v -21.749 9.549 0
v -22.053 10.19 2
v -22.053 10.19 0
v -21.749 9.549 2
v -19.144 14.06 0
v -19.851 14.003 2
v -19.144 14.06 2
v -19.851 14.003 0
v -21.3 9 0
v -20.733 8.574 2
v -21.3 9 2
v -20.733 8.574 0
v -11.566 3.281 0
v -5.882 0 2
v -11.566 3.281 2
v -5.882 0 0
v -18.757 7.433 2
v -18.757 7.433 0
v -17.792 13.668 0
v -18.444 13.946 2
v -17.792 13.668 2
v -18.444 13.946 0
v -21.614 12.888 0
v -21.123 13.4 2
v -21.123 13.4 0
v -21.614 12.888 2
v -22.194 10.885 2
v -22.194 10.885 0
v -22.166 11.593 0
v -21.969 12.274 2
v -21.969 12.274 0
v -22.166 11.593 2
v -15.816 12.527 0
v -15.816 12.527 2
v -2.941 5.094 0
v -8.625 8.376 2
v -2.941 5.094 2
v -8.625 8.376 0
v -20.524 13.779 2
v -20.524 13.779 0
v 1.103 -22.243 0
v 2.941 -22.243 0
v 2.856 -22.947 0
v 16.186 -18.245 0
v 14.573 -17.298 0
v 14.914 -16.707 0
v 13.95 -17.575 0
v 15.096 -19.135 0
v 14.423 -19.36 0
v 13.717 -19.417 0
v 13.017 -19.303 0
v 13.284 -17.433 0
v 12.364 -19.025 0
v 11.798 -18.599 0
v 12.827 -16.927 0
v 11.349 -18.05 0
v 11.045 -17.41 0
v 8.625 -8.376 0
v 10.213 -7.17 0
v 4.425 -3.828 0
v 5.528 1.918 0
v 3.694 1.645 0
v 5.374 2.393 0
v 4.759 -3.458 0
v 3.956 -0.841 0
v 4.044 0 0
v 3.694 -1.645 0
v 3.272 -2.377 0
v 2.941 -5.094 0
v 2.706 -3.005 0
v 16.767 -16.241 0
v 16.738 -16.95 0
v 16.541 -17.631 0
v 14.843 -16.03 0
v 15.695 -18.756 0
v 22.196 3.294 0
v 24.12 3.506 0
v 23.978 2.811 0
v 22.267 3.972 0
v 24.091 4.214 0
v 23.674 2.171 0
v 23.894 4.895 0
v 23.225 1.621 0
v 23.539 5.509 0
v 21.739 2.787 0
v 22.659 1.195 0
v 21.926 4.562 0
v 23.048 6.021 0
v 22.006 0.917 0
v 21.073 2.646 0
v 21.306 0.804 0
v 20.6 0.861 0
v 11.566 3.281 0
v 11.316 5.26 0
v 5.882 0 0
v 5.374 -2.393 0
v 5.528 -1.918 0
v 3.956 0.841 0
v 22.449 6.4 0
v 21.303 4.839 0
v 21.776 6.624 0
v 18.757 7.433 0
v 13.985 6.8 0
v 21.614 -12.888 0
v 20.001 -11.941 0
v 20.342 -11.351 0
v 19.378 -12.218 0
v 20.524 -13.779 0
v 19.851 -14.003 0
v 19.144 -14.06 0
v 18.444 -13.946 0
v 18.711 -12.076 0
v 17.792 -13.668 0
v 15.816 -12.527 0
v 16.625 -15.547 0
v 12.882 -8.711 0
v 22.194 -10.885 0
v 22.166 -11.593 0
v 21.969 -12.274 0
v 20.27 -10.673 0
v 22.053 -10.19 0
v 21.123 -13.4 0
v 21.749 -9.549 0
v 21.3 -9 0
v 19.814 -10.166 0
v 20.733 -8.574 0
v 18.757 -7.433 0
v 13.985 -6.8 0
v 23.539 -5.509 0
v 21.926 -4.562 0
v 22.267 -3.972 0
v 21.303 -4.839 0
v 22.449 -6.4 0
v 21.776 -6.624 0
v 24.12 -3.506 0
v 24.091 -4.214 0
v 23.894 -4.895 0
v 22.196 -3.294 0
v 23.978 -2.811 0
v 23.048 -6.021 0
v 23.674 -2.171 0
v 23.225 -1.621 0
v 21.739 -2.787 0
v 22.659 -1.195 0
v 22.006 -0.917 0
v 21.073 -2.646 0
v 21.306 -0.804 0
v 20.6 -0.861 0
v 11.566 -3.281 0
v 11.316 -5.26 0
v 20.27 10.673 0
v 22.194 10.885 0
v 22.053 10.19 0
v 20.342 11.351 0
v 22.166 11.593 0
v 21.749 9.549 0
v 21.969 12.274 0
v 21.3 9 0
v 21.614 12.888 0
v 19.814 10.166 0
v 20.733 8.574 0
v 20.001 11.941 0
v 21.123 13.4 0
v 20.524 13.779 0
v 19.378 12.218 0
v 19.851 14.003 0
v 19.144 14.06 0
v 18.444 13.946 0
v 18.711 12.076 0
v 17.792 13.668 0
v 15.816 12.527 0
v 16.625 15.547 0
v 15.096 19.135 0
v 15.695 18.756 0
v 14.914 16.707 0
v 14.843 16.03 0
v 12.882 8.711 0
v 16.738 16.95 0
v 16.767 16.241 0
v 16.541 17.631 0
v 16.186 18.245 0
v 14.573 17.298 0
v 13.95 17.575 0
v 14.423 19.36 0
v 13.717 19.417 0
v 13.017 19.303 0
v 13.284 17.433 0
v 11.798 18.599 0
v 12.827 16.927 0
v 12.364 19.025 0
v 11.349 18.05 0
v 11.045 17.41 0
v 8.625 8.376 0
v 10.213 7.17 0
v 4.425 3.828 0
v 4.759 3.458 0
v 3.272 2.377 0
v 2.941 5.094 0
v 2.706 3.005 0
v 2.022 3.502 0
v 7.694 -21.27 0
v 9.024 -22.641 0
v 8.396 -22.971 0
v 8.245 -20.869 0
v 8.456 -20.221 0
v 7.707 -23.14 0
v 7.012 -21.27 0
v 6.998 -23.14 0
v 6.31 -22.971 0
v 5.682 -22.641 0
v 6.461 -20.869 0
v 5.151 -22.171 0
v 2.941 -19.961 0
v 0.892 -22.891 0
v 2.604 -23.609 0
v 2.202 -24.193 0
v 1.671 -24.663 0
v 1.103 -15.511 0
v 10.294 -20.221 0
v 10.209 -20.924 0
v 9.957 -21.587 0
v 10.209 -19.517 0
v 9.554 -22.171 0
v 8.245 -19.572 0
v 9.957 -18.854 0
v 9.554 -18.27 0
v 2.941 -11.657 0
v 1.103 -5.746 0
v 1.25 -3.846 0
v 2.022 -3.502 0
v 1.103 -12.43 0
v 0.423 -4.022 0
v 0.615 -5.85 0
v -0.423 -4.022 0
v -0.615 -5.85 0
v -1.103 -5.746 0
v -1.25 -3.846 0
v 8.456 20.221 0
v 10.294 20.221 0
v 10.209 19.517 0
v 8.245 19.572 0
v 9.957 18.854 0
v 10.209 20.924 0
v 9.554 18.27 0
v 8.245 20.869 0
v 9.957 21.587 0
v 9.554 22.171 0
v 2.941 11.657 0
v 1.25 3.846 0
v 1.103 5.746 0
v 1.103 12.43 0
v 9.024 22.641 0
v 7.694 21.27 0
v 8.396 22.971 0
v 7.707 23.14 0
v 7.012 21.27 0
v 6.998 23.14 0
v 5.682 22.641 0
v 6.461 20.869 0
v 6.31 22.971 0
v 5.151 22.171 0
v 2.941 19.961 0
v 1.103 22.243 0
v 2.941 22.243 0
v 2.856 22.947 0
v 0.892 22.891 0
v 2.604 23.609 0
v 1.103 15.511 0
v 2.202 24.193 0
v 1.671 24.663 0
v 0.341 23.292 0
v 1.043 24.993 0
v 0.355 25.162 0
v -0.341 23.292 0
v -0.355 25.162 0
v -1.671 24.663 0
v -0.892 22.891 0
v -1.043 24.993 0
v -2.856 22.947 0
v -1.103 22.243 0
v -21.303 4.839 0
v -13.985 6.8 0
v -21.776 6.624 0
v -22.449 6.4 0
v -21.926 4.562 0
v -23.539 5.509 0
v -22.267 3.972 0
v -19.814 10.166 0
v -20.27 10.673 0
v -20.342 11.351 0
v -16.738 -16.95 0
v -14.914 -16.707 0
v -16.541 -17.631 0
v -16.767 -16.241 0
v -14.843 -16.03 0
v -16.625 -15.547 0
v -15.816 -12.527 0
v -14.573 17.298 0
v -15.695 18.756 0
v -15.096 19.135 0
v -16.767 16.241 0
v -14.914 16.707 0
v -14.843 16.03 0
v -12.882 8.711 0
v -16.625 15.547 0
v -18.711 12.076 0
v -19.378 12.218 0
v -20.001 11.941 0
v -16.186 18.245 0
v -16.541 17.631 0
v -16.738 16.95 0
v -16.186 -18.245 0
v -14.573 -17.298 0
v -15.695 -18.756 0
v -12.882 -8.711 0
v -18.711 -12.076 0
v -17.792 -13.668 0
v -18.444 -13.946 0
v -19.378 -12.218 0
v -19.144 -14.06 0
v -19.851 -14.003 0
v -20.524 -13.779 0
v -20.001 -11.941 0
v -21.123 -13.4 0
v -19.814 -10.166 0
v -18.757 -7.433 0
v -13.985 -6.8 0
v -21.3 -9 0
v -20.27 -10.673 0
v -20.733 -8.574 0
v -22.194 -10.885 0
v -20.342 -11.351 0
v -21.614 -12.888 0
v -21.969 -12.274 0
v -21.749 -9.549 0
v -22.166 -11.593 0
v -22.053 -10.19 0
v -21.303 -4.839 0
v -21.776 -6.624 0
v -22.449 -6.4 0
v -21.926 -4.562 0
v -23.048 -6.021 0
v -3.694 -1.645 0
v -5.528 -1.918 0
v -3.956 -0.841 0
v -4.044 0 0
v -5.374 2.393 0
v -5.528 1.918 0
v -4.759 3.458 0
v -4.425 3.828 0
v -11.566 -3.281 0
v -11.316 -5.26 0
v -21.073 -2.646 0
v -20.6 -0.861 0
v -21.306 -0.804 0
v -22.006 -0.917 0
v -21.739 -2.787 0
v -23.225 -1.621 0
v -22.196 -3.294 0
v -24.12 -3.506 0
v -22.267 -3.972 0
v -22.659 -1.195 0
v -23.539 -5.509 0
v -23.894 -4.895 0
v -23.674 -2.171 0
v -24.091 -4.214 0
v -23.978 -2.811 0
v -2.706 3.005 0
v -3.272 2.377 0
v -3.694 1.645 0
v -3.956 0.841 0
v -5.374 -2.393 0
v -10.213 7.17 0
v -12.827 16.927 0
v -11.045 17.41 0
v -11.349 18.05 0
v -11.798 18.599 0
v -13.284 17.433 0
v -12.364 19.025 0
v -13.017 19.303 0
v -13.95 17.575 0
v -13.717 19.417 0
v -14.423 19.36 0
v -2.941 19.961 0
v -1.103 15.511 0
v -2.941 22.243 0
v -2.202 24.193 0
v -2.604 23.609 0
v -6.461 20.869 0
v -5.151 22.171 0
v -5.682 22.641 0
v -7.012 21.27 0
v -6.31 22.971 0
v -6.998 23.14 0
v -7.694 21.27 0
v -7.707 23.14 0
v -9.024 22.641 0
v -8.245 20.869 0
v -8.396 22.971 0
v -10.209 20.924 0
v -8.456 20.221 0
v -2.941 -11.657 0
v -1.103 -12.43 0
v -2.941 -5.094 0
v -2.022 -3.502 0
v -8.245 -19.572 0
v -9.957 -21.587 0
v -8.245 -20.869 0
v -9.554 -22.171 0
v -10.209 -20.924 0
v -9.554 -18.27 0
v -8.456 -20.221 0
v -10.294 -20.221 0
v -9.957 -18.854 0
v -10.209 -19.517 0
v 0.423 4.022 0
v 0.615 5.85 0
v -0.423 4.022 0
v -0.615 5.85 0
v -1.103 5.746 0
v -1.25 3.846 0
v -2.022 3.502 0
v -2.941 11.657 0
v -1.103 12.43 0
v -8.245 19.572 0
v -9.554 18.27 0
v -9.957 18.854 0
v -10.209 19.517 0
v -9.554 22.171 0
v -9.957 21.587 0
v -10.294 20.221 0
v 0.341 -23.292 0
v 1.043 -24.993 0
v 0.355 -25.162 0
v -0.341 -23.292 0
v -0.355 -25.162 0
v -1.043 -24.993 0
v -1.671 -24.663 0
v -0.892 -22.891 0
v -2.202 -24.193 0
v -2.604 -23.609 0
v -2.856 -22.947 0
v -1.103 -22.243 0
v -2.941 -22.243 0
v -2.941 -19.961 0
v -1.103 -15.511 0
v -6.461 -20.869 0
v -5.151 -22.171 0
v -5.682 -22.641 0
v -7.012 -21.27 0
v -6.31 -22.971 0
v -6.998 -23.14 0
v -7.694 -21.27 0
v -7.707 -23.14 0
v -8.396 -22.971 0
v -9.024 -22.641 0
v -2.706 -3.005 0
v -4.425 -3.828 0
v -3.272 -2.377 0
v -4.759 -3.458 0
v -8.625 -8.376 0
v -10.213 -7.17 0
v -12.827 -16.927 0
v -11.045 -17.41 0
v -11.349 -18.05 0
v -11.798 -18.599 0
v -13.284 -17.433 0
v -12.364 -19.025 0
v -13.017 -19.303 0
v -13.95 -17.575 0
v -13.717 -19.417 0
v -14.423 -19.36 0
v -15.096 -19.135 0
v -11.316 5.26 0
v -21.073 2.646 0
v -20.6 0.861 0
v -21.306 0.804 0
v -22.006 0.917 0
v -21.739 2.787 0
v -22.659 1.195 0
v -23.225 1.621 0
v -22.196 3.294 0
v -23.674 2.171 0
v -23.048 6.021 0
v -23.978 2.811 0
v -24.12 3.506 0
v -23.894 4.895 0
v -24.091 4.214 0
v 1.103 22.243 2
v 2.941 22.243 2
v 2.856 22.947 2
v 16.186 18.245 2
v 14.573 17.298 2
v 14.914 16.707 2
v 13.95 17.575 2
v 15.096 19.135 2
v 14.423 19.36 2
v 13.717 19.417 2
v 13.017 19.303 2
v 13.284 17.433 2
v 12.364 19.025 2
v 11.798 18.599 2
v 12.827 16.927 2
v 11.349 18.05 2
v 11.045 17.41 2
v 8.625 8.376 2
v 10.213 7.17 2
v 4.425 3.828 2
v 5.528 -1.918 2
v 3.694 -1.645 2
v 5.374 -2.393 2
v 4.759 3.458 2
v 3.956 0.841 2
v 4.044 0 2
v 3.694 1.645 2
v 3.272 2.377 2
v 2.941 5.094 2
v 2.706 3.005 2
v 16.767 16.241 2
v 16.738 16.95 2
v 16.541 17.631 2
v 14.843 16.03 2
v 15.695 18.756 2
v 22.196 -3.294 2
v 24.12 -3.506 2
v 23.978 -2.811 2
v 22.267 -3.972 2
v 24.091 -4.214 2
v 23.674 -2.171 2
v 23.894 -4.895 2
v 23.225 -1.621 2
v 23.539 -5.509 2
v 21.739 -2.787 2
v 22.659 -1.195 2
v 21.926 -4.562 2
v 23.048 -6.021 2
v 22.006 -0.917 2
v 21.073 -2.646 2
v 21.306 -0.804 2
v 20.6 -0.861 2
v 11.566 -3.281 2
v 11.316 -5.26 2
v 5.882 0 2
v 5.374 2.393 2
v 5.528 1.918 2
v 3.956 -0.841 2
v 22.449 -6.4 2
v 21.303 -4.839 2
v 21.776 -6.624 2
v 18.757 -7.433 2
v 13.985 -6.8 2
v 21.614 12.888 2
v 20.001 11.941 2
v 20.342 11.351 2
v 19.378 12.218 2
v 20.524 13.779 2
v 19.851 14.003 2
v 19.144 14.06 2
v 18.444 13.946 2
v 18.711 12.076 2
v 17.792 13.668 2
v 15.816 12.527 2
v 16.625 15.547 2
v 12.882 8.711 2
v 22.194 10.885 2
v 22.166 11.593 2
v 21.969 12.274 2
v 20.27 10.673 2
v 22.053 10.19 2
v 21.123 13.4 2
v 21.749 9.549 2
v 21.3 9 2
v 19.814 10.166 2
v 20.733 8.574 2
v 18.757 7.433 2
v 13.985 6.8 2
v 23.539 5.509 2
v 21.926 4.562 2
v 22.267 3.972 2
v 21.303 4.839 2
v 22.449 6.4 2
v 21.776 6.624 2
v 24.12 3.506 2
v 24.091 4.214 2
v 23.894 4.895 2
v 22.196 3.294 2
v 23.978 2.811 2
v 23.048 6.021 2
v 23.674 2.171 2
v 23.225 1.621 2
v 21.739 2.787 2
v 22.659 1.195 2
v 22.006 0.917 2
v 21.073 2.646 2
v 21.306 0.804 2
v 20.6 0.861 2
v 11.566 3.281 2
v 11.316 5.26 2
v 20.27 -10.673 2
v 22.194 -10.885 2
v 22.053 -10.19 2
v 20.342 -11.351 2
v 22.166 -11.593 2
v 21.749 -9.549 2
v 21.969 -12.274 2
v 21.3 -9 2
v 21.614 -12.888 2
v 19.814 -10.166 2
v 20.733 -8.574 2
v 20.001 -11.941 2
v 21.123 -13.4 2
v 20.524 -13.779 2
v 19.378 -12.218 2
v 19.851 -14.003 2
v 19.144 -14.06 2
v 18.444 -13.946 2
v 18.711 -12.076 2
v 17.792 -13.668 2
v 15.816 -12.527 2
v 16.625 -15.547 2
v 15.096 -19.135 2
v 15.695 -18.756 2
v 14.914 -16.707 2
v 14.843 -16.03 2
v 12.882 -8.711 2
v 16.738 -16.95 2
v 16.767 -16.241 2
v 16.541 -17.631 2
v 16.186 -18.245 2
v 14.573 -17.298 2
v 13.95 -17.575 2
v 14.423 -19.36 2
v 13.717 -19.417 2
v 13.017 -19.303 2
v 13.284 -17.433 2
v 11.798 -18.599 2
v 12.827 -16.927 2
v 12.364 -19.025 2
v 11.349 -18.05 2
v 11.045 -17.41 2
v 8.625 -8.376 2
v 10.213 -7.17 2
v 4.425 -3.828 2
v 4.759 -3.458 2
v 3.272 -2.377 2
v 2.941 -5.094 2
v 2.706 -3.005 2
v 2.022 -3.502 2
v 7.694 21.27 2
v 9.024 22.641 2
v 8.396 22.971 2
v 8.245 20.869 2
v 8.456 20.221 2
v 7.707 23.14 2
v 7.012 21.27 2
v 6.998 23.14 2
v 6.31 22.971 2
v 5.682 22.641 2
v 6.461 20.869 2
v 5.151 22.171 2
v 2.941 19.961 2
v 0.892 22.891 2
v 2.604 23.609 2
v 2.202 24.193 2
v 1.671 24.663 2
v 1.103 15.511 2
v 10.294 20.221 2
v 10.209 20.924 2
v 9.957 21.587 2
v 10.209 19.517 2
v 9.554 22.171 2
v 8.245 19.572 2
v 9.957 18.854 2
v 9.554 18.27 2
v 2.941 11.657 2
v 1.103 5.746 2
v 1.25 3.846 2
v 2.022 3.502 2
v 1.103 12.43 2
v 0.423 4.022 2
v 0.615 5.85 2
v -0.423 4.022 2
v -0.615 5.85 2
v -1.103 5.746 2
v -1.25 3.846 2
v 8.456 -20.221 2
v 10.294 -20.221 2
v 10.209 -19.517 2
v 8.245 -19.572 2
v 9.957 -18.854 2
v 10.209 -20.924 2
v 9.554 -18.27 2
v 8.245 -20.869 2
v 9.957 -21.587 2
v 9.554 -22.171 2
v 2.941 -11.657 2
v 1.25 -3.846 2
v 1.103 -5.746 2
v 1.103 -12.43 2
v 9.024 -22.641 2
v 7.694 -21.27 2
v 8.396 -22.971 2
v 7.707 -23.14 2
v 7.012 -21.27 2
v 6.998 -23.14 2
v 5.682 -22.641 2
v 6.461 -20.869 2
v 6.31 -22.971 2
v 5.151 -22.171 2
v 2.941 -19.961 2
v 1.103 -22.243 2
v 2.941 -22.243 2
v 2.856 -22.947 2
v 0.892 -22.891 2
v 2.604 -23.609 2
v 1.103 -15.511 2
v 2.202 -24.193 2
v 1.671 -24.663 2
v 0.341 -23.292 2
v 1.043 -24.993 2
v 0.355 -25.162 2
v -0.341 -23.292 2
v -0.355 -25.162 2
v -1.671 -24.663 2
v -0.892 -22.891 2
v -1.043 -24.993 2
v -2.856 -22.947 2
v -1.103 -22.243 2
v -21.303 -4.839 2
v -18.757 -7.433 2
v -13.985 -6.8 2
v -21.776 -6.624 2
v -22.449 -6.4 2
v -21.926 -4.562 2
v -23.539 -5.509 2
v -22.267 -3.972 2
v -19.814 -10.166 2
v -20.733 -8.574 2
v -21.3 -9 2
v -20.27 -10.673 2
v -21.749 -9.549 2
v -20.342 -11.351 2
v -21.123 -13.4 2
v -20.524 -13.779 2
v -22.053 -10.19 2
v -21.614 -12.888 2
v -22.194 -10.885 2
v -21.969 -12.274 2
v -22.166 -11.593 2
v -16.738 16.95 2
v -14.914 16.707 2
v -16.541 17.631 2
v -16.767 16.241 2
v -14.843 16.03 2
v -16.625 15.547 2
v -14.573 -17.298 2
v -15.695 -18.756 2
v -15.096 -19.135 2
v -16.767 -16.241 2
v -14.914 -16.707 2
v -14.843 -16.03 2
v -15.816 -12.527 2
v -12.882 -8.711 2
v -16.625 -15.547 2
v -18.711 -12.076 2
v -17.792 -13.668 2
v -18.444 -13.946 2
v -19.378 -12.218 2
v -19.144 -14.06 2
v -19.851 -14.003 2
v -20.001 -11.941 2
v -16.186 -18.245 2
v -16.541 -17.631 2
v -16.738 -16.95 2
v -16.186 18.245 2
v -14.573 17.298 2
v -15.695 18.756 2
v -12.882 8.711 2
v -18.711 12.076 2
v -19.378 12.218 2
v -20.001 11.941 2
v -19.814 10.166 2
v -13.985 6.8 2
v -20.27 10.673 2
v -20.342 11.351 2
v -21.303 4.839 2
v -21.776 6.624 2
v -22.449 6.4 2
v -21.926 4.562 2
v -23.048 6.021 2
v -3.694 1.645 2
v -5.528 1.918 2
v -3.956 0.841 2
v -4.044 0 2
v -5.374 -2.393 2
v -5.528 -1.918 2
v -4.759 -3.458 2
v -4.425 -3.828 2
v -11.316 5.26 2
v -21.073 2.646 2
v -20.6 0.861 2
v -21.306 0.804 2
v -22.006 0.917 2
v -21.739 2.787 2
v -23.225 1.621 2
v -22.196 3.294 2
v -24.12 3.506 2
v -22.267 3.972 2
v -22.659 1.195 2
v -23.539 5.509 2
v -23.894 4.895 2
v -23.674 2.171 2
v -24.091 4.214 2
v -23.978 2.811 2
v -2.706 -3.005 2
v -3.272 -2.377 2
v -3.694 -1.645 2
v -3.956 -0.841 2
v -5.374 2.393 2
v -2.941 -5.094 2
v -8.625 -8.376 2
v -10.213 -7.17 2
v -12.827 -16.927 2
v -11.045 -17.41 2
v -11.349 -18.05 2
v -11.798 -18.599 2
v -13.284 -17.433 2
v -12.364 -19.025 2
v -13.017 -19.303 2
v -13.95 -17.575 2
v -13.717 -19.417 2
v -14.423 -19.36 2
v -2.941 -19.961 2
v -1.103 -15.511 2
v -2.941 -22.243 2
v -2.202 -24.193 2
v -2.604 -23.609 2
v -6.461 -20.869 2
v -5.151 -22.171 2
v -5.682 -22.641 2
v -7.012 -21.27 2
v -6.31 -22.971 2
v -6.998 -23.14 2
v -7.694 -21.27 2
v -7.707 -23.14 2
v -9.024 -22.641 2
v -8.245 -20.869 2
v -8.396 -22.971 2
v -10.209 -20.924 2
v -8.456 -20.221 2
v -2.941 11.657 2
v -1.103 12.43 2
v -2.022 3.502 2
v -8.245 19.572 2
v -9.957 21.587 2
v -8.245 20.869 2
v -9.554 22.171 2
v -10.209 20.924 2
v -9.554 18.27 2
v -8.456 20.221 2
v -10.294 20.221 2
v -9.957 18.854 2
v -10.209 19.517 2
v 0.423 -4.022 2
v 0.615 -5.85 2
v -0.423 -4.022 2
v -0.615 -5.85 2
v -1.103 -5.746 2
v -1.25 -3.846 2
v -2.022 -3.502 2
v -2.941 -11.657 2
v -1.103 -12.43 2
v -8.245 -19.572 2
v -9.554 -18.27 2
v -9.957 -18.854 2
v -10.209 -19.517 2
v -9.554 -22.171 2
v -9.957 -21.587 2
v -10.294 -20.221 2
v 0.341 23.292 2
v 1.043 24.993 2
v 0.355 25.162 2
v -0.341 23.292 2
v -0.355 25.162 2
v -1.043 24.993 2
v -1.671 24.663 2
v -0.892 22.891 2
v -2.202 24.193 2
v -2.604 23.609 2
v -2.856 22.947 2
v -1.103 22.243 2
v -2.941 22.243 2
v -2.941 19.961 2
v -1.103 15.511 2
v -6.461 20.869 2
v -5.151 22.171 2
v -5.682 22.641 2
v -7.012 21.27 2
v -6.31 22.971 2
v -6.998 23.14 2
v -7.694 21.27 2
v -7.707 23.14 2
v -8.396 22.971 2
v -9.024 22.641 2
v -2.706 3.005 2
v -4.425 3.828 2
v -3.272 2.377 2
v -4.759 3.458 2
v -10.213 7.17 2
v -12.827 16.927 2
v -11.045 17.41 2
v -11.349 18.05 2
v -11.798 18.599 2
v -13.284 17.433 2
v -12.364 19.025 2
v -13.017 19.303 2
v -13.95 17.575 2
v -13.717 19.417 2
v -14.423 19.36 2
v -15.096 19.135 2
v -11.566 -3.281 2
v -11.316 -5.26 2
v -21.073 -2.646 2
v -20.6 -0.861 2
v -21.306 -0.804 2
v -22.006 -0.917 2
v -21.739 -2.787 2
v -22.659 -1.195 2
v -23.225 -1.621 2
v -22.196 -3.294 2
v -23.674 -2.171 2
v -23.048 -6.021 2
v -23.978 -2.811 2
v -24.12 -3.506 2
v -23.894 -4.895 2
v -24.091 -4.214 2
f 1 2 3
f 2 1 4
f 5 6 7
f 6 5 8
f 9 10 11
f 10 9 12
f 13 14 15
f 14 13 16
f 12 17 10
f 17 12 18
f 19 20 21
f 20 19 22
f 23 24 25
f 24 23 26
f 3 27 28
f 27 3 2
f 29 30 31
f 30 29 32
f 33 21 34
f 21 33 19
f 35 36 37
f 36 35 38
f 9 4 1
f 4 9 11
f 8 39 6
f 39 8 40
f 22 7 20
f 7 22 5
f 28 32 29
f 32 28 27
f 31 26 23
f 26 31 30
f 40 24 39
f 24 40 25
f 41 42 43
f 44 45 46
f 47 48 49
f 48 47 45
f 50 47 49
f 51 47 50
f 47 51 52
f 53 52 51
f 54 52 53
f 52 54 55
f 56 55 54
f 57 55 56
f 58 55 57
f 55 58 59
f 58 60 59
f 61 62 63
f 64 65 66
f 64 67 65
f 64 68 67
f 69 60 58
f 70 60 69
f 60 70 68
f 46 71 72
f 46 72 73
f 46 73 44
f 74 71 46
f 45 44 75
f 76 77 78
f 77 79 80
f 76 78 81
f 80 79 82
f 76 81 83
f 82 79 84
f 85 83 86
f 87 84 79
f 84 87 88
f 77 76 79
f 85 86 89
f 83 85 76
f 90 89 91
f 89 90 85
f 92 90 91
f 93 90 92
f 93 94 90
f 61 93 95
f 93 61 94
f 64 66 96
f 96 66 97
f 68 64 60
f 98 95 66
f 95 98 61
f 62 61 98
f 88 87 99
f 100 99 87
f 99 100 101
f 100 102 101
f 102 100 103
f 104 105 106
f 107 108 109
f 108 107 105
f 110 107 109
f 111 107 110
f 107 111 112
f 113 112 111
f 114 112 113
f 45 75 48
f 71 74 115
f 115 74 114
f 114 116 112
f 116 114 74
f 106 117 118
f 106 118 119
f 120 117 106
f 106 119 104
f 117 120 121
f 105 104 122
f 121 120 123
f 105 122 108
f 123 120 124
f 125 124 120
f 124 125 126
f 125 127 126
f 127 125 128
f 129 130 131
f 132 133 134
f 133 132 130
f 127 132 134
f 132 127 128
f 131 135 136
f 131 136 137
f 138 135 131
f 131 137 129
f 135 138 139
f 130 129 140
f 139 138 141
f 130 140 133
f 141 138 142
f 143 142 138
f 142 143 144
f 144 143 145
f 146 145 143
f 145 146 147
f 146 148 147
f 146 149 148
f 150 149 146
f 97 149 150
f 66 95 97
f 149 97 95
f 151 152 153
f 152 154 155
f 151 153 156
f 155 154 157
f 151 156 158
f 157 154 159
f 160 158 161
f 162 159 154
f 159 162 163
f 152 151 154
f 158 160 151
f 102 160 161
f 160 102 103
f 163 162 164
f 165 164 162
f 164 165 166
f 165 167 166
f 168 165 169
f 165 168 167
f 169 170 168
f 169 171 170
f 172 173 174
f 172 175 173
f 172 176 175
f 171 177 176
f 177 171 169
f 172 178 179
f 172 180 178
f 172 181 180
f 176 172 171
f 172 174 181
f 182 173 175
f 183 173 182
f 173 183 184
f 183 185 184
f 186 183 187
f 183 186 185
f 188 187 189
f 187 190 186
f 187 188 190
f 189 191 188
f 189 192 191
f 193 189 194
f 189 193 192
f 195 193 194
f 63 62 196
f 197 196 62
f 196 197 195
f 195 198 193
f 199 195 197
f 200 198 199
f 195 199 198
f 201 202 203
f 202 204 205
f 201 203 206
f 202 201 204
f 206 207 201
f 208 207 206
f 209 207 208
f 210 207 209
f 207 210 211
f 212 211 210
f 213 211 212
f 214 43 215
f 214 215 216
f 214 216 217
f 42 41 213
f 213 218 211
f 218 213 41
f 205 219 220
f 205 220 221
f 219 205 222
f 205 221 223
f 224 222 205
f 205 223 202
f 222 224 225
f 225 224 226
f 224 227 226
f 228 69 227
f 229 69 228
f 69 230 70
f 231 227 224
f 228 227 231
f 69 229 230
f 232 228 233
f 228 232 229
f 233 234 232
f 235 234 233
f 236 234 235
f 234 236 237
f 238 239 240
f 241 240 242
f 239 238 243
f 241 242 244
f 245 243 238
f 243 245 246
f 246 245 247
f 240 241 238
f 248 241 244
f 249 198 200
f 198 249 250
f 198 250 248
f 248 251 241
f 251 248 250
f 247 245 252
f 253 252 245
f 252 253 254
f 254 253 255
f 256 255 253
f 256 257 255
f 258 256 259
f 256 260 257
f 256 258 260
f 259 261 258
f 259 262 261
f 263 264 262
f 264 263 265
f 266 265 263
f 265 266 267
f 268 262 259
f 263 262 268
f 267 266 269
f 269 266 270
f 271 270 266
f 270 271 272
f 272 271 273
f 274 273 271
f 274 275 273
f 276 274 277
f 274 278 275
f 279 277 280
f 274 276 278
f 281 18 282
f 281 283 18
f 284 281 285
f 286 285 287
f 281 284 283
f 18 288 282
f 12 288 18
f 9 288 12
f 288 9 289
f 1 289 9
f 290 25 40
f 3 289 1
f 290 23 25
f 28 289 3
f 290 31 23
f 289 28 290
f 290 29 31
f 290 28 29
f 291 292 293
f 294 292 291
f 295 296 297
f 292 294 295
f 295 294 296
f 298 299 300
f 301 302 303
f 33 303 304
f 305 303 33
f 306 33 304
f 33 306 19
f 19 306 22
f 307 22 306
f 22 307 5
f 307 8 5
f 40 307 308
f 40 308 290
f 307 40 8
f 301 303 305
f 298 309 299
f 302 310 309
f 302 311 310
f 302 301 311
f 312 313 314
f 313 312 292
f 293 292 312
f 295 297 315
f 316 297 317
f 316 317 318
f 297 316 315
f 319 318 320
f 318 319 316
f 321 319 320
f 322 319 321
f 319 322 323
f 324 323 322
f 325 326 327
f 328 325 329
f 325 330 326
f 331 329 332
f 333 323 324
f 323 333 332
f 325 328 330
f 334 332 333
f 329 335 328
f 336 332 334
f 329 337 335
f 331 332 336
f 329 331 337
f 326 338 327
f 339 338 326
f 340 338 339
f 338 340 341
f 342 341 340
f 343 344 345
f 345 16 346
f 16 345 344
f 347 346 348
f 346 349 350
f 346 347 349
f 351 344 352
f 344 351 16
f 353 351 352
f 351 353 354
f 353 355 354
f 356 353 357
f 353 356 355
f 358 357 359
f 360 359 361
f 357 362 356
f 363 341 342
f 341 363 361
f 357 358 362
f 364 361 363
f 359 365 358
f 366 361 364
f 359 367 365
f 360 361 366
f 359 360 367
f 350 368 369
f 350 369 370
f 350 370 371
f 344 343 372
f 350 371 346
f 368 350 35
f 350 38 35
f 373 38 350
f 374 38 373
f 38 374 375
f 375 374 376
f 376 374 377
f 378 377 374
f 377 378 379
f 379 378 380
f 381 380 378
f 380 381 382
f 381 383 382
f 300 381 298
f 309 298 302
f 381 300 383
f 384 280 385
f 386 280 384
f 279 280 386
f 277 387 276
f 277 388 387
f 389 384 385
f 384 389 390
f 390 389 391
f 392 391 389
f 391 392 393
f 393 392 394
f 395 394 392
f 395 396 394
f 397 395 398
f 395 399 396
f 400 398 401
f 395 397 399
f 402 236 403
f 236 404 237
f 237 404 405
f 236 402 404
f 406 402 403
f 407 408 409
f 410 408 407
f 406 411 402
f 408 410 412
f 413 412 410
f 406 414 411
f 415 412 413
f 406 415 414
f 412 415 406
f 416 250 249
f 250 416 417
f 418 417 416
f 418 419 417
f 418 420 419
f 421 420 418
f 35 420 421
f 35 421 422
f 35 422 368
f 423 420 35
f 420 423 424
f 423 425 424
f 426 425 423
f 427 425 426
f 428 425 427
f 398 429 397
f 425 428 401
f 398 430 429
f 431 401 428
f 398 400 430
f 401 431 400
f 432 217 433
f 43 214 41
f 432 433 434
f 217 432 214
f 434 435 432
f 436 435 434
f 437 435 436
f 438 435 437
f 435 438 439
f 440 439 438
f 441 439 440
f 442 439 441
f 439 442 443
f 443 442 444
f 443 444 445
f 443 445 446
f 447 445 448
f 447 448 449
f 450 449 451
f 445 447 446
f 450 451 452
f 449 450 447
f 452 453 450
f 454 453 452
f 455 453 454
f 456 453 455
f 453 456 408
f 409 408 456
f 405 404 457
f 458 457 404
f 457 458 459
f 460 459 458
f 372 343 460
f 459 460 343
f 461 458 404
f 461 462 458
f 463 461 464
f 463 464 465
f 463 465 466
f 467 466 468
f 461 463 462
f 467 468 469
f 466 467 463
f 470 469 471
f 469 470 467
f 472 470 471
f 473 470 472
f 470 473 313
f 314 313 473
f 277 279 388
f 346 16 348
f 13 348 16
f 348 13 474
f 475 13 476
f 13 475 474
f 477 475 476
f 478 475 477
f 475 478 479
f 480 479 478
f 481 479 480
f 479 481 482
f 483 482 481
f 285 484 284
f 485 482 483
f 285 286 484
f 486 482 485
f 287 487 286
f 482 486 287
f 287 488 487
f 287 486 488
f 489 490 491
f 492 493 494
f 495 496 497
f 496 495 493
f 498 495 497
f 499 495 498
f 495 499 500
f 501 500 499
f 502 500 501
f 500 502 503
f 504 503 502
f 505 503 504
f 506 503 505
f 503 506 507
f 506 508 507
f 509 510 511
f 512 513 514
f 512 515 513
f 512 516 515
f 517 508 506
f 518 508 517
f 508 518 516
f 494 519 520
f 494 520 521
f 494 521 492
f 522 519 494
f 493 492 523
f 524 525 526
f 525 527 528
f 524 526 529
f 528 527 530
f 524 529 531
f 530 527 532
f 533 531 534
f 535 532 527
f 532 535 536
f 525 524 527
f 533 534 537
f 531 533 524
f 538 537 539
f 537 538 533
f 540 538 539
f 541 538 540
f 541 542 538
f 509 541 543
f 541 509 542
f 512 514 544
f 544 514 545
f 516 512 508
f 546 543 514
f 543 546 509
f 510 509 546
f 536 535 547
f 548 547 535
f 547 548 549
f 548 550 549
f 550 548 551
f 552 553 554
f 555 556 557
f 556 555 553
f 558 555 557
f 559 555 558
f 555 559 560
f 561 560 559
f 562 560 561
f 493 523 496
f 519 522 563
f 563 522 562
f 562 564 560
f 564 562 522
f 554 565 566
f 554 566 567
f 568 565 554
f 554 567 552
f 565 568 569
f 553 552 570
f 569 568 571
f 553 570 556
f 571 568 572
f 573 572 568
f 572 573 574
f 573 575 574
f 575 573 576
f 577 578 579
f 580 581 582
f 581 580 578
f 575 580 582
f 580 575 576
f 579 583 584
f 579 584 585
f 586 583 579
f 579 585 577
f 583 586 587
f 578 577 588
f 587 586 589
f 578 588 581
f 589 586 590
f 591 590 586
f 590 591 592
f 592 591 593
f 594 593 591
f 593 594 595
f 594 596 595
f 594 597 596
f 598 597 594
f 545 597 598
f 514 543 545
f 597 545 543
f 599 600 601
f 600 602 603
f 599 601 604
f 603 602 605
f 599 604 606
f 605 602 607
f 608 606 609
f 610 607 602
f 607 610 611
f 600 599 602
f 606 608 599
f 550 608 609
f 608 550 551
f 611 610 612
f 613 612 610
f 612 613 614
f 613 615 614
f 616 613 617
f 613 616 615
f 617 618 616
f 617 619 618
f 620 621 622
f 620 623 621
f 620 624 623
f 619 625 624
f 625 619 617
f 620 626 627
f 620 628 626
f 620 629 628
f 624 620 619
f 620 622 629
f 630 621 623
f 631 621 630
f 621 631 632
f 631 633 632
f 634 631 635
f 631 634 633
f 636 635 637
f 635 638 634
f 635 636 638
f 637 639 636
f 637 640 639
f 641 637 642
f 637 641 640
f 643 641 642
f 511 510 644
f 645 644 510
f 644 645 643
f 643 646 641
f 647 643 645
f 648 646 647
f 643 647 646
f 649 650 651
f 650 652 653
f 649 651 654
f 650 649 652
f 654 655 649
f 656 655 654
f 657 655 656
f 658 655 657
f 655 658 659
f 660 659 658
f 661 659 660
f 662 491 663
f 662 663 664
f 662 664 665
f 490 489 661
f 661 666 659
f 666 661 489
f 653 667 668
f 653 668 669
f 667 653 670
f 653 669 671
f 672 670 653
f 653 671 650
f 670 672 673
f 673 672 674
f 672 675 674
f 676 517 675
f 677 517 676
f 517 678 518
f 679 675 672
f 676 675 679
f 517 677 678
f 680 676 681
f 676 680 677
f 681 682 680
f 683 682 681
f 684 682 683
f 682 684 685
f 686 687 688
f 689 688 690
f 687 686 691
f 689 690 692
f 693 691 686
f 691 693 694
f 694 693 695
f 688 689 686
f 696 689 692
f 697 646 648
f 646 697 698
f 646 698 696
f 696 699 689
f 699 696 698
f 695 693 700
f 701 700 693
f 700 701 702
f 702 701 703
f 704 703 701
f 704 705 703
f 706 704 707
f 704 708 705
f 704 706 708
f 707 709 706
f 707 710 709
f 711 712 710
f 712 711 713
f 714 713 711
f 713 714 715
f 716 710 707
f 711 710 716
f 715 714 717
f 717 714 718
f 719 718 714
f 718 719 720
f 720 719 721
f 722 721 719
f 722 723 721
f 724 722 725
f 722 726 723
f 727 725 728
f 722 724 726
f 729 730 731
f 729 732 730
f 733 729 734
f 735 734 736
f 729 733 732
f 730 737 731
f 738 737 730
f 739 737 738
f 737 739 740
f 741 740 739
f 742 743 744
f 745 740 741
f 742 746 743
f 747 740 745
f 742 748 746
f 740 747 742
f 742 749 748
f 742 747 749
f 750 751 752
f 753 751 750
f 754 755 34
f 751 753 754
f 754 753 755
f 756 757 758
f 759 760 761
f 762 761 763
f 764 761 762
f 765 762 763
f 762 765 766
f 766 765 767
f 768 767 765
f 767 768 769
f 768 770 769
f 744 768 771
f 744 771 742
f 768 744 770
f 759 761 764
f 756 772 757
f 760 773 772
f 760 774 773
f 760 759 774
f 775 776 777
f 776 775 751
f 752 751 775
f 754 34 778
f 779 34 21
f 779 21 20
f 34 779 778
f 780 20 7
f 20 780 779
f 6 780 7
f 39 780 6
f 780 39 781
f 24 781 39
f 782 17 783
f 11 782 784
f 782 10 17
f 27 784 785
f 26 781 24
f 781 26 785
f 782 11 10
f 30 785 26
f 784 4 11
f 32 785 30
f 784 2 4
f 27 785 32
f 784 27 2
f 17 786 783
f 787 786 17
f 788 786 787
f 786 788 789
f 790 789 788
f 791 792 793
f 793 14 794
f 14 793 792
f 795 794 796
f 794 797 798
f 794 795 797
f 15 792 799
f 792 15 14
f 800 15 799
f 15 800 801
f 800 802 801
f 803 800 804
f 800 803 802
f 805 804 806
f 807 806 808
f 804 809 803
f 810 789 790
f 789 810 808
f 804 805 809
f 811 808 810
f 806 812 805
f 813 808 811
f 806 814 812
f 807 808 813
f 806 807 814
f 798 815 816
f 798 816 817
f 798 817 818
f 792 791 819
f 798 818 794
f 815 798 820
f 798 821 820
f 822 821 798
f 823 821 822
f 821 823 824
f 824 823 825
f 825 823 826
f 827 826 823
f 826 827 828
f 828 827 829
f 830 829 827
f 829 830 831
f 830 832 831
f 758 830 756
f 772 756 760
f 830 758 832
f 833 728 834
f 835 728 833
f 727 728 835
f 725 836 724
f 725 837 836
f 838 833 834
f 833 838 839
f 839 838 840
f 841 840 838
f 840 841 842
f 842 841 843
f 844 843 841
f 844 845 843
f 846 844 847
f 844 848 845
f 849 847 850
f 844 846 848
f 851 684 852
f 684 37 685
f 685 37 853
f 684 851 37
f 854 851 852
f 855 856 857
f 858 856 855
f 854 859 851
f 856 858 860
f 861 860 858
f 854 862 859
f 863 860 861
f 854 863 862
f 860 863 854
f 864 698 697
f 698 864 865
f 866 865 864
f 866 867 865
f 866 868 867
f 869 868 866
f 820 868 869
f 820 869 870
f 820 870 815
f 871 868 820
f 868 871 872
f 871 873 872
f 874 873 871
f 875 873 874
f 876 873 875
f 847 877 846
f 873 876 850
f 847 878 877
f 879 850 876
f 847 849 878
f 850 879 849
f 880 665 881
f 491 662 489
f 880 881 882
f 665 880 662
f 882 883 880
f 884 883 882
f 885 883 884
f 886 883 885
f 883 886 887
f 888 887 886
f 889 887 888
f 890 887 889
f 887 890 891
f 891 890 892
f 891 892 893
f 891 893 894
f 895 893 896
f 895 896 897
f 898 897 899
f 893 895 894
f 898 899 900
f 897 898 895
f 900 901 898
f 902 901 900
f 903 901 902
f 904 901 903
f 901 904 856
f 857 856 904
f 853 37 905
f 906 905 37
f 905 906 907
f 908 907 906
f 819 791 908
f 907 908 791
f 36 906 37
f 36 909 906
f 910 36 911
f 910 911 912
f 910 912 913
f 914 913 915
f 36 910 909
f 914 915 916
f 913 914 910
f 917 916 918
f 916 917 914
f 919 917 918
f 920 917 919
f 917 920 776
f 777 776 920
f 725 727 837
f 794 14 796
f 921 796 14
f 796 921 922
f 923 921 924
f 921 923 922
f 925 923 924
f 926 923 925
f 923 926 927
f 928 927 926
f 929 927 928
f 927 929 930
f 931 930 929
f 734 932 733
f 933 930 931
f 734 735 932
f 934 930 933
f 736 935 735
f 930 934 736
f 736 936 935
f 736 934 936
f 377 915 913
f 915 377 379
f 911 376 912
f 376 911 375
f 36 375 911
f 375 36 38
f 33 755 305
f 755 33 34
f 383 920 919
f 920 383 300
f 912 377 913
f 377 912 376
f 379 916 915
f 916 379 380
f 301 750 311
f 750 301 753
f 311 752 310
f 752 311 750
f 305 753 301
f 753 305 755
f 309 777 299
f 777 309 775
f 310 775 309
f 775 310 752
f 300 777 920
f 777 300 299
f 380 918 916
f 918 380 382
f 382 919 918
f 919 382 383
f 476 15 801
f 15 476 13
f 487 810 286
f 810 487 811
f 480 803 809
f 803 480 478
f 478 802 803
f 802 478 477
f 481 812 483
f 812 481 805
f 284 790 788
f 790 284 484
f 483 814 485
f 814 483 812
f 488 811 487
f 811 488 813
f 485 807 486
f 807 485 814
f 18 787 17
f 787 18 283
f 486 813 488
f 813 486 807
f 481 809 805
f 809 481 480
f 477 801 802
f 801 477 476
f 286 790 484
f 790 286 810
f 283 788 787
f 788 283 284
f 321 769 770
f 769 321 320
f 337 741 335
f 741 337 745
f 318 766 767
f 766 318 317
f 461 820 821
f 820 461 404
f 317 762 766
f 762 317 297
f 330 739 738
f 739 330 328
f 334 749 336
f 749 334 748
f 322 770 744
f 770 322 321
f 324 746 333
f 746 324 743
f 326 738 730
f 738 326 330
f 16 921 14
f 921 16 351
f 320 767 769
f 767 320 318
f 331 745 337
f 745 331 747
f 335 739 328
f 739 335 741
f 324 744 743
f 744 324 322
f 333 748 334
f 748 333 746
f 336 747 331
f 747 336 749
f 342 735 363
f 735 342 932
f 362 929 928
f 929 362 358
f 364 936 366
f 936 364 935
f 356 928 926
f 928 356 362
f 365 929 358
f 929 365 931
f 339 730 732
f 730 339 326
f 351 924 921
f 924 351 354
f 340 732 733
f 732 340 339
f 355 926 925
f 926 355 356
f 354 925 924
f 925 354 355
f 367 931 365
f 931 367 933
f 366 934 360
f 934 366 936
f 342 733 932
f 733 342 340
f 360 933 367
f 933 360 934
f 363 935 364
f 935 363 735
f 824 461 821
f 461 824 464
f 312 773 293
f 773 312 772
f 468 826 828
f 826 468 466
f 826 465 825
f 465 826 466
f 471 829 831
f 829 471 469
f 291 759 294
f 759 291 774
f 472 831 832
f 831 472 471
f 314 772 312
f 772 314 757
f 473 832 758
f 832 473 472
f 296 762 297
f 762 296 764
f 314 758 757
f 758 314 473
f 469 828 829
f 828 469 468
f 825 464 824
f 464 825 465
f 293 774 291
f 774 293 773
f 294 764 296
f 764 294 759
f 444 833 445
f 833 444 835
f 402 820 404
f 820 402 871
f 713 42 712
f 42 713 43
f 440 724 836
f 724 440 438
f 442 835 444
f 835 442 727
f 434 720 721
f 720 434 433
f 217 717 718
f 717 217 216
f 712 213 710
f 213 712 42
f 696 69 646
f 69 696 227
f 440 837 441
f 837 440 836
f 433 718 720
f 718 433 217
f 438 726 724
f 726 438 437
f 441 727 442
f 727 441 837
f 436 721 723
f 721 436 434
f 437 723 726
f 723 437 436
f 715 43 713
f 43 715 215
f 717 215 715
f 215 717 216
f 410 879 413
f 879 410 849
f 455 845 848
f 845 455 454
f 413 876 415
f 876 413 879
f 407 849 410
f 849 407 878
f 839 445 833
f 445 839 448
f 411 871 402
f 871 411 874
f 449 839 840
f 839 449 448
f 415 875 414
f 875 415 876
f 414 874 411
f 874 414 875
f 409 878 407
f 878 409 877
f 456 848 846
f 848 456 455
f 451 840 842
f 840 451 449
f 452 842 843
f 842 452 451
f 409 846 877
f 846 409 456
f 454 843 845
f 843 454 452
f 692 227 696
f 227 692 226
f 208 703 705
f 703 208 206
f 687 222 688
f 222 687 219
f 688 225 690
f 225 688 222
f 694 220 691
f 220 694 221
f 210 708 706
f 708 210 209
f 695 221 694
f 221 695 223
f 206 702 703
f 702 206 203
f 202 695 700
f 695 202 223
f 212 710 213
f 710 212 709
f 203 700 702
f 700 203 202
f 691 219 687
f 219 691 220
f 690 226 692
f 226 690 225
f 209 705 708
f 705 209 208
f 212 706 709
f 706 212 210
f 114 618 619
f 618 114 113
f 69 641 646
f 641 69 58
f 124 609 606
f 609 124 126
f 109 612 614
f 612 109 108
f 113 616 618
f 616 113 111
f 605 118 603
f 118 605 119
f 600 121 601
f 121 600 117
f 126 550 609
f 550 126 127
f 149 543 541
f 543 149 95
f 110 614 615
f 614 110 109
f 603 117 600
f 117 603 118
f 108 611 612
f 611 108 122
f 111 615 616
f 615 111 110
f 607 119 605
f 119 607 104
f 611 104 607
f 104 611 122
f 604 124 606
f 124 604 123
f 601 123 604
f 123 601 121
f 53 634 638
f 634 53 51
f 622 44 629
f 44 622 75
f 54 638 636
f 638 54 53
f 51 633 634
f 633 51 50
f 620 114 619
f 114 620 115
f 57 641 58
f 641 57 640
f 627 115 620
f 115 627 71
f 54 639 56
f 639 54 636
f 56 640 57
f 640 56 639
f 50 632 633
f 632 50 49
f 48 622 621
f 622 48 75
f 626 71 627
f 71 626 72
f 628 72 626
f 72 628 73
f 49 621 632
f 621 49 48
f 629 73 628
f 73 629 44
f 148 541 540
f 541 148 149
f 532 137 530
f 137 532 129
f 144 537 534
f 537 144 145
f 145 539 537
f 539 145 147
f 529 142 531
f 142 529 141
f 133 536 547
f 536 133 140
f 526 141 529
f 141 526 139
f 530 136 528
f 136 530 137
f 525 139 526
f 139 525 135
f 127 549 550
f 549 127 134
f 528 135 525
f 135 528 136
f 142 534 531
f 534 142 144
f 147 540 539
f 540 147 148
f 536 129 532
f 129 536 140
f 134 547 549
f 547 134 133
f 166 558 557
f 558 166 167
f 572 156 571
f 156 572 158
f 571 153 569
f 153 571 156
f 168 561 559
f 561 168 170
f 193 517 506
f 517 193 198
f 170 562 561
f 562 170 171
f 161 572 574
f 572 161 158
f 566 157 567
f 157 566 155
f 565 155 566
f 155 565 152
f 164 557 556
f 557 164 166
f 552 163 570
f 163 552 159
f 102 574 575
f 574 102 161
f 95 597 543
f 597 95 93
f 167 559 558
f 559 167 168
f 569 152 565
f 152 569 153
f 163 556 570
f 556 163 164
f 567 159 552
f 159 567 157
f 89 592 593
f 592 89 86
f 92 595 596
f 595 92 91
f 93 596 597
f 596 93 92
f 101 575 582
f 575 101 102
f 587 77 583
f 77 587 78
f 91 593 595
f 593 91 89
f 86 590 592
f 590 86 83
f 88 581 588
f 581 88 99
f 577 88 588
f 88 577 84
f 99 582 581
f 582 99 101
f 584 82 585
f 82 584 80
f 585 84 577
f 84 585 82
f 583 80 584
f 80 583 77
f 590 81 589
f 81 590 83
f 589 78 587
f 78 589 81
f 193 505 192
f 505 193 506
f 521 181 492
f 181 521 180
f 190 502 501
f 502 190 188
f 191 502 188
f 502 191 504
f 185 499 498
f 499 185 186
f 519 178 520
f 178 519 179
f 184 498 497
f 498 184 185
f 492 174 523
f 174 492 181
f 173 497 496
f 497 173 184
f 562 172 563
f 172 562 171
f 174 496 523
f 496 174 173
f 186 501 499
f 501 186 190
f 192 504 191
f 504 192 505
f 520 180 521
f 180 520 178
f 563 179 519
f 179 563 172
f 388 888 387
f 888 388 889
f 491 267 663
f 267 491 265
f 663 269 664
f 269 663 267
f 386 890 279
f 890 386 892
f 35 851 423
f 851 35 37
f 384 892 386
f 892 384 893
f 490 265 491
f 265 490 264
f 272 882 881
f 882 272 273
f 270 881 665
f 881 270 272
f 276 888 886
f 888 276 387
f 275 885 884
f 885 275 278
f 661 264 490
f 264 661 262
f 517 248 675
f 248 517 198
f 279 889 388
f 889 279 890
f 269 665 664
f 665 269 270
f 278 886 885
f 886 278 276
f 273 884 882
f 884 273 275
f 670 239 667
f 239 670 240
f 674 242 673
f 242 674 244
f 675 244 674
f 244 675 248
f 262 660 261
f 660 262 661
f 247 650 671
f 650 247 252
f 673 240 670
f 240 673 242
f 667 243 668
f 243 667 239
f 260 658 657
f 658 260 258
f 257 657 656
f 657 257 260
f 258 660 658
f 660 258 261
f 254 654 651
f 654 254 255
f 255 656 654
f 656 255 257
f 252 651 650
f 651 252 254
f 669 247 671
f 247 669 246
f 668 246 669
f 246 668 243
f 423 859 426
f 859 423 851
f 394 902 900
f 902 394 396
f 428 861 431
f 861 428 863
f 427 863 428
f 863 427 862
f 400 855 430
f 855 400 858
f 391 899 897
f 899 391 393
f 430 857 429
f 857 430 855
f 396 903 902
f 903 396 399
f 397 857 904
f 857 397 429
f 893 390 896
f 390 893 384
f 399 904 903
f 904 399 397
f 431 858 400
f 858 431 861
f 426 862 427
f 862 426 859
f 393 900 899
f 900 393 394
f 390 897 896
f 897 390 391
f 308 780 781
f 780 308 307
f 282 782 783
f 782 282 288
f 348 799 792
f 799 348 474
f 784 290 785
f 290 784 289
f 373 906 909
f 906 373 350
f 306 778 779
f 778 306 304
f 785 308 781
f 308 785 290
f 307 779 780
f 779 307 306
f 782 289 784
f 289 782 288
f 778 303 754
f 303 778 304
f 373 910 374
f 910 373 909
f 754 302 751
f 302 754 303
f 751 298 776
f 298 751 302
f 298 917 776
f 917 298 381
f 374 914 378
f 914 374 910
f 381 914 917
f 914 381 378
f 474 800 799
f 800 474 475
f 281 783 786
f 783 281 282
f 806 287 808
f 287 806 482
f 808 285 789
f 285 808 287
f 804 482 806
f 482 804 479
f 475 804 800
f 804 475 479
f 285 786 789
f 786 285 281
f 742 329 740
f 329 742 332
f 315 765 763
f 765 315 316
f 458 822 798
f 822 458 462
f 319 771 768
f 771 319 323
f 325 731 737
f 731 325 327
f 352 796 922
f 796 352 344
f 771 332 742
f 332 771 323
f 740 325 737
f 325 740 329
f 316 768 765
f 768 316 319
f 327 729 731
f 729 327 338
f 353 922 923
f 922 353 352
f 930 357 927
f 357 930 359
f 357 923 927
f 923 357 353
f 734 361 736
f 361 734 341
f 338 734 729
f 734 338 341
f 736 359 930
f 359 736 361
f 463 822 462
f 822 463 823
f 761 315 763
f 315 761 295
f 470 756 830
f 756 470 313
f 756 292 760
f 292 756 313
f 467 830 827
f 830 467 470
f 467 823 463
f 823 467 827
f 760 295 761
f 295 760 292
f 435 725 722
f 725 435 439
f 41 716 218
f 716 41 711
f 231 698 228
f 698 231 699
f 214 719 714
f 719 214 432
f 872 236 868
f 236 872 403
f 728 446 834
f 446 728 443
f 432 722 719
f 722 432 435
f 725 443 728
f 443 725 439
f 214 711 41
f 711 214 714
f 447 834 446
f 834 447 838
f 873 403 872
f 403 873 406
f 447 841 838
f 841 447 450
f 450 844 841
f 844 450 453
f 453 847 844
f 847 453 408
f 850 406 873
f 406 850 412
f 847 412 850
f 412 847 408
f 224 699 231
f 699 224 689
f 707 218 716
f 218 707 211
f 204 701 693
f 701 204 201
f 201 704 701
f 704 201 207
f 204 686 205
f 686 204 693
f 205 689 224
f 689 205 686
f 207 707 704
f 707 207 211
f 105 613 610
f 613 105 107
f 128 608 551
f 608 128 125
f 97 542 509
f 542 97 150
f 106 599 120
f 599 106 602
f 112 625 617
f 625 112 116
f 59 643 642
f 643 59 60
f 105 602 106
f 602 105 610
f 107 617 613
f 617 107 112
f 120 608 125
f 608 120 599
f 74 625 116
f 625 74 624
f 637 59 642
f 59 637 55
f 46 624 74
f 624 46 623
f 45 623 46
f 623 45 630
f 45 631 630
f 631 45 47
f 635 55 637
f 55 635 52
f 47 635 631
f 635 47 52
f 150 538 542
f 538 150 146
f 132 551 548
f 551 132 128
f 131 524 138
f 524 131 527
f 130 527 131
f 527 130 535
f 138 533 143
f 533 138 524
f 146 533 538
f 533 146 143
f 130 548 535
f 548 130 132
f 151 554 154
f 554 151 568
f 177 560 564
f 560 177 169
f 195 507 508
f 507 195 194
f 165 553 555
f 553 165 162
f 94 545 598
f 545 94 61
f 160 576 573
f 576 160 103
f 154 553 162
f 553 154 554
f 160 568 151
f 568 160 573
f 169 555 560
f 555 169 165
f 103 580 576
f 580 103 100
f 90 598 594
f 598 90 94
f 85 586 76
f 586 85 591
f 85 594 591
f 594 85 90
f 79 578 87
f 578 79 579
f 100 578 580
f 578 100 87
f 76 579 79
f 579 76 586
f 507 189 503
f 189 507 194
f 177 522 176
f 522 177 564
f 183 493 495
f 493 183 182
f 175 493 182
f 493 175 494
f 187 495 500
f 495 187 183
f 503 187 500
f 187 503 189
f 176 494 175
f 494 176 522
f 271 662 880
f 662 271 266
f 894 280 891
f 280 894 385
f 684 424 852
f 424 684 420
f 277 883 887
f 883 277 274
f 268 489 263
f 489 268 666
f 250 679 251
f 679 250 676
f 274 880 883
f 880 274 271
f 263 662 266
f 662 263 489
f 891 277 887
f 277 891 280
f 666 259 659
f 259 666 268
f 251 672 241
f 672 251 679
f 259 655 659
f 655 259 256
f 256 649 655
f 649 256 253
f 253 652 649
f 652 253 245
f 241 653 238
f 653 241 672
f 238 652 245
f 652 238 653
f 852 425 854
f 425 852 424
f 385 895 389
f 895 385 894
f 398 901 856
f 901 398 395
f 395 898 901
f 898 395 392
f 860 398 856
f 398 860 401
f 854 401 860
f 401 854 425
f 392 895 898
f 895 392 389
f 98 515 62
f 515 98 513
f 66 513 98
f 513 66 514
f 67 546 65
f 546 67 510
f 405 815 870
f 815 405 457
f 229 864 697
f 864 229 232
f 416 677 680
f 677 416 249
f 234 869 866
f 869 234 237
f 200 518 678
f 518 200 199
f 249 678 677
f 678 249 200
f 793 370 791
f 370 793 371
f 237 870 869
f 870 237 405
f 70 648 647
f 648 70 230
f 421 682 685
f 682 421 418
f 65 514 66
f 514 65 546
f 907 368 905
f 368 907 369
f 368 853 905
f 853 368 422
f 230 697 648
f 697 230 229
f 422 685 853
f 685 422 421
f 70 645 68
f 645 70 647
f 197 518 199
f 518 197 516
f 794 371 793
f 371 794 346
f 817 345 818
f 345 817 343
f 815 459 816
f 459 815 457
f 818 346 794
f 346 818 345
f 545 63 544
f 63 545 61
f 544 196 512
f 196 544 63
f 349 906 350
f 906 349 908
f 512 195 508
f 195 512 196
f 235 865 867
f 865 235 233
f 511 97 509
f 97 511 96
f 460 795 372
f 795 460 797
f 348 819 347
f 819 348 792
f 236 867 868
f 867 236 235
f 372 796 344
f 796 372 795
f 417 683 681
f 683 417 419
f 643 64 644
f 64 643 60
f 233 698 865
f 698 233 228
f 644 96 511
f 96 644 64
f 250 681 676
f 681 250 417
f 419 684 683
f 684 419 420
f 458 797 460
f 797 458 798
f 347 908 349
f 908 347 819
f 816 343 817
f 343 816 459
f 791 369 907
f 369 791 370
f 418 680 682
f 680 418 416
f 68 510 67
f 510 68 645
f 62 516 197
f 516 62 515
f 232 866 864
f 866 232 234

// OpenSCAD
//!OpenSCAD

arms = 6; //[2:1:9]
diameter = 50;
thickness = 2;

scale([(diameter / 136), (diameter / 136), 1]){
difference() {
for (j = [1 : abs(1) : arms]) {
rotate([0, 0, (j * (360 / arms))]){
// chain hull
for (i = [0 : abs(50) : 50 - 50]) {
hull() {
translate([0, (10.5 + i), 0]){
cylinder(r1=8, r2=8, h=thickness, center=false);
}
translate([0, (10.5 + (i + 50)), 0]){
cylinder(r1=8, r2=8, h=thickness, center=false);
}
}  // end hull (in loop)
} // end loop

// chain hull
for (i = [0 : abs(20) : 20 - 20]) {
hull() {
translate([i, (35 + i), 0]){
cylinder(r1=8, r2=8, h=thickness, center=false);
}
translate([(i + 20), (35 + (i + 20)), 0]){
cylinder(r1=8, r2=8, h=thickness, center=false);
}
}  // end hull (in loop)
} // end loop

// chain hull
for (i = [0 : abs(20) : 20 - 20]) {
hull() {
translate([(i * -1), (35 + i), 0]){
cylinder(r1=8, r2=8, h=thickness, center=false);
}
translate([((i + 20) * -1), (35 + (i + 20)), 0]){
cylinder(r1=8, r2=8, h=thickness, center=false);
}
}  // end hull (in loop)
} // end loop

}
}

for (j = [1 : abs(1) : arms]) {
rotate([0, 0, (j * (360 / arms))]){
// chain hull
for (i = [0 : abs(50) : 50 - 50]) {
hull() {
translate([0, (10.5 + i), 0]){
cylinder(r1=3, r2=3, h=thickness, center=false);
}
translate([0, (10.5 + (i + 50)), 0]){
cylinder(r1=3, r2=3, h=thickness, center=false);
}
}  // end hull (in loop)
} // end loop

// chain hull
for (i = [0 : abs(20) : 20 - 20]) {
hull() {
translate([i, (35 + i), 0]){
cylinder(r1=3, r2=3, h=thickness, center=false);
}
translate([(i + 20), (35 + (i + 20)), 0]){
cylinder(r1=3, r2=3, h=thickness, center=false);
}
}  // end hull (in loop)
} // end loop

// chain hull
for (i = [0 : abs(20) : 20 - 20]) {
hull() {
translate([(i * -1), (35 + i), 0]){
cylinder(r1=3, r2=3, h=thickness, center=false);
}
translate([((i + 20) * -1), (35 + (i + 20)), 0]){
cylinder(r1=3, r2=3, h=thickness, center=false);
}
}  // end hull (in loop)
} // end loop

}
}

cylinder(r1=11, r2=11, h=thickness, center=false);
}
difference() {
cylinder(r1=16, r2=16, h=thickness, center=false);

cylinder(r1=11, r2=11, h=thickness, center=false);
}
}
